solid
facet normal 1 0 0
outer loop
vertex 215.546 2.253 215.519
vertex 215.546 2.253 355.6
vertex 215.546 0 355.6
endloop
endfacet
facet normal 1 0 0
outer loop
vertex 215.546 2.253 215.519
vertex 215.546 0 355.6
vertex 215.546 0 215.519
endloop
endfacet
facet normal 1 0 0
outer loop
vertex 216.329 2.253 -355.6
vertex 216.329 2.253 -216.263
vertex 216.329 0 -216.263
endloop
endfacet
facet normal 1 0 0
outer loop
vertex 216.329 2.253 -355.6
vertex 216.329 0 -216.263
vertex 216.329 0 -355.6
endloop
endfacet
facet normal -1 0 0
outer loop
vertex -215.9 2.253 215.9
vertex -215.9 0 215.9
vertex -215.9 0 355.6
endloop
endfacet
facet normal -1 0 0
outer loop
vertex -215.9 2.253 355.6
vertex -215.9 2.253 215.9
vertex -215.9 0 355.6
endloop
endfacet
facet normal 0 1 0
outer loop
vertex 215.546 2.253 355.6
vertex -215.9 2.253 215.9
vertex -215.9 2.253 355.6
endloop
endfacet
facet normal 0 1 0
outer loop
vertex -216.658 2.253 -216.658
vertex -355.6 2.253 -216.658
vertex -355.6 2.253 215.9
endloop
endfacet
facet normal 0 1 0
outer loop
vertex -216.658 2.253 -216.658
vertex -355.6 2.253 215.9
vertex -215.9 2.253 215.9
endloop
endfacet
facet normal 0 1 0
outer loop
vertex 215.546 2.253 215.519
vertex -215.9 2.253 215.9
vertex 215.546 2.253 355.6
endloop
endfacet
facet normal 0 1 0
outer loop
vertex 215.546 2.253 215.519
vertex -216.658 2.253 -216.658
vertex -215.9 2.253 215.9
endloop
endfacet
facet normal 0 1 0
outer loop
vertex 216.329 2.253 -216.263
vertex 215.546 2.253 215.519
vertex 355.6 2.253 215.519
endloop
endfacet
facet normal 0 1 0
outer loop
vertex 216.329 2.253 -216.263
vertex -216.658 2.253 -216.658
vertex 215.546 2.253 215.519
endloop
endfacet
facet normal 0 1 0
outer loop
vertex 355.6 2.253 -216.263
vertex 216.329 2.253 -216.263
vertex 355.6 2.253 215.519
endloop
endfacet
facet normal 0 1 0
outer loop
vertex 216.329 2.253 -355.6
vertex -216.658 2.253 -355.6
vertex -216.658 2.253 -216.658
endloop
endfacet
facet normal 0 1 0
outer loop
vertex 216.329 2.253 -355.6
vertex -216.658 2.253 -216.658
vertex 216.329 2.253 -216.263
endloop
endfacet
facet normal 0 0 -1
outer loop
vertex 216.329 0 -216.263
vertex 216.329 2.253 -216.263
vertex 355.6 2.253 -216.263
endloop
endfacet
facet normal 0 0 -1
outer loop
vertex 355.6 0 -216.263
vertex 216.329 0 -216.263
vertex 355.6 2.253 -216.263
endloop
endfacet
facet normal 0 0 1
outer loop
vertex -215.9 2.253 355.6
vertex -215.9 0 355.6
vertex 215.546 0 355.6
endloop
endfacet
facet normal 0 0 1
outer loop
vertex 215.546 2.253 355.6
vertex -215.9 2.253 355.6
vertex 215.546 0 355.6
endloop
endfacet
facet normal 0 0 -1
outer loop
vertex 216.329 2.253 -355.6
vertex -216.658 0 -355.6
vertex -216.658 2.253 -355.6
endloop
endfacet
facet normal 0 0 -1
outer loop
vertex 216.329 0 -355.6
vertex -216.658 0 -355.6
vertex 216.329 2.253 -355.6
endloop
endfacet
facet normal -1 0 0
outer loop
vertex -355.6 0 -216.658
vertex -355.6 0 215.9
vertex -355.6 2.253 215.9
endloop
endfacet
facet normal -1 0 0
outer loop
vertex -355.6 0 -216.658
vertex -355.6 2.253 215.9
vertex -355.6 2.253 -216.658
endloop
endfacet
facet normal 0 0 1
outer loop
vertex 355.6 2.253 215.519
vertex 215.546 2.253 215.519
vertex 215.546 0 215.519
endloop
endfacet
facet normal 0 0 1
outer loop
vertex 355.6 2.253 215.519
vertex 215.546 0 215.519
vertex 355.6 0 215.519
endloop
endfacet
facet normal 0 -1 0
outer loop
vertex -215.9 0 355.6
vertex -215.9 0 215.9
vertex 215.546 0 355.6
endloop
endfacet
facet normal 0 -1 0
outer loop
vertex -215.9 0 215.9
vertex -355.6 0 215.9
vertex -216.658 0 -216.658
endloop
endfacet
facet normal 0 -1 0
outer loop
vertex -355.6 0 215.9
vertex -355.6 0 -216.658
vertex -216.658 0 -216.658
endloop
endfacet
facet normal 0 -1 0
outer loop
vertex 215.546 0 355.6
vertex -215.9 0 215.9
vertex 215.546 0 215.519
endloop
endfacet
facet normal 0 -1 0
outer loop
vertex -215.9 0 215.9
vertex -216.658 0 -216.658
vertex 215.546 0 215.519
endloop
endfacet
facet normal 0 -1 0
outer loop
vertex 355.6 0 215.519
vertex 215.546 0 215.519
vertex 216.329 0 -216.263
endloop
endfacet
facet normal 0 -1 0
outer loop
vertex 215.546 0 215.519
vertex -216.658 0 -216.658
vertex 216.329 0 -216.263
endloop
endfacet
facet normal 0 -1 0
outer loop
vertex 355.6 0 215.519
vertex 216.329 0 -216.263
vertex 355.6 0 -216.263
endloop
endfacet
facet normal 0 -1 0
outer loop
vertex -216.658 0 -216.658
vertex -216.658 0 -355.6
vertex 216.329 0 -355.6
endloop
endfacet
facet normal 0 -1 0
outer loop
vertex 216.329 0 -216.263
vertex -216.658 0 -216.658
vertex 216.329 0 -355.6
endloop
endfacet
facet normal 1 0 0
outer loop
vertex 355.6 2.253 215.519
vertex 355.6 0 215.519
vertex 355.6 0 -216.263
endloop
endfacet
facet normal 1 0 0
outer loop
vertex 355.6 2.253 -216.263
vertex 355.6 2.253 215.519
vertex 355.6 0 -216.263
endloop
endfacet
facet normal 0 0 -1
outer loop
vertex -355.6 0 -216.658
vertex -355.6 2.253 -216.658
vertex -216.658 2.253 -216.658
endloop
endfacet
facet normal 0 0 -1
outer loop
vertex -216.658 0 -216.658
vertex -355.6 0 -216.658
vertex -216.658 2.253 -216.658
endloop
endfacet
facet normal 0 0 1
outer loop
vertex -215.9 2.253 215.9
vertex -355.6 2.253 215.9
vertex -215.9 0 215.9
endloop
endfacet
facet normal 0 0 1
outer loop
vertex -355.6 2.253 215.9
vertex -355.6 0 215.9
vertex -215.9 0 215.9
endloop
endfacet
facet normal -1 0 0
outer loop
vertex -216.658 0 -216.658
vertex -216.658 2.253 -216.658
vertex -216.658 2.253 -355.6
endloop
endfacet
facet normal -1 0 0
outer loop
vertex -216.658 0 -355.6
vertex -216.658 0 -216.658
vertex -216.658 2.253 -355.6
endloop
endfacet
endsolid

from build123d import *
from OCP.BRepAlgoAPI import BRepAlgoAPI_Cut
from OCP.TopTools import TopTools_ListOfShape

# Parameters (mm, degrees)
SKETCH1_W           = 711.2
SKETCH1_H           = 711.2
BOSS_EXTRUDE1_DEPTH = 2.252762246
SKETCH2_W           = 139.700021816
SKETCH2_H           = 139.700021816
CUT_EXTRUDE2_DEPTH  = 67.238084533
SKETCH3_W           = 140.054303581
SKETCH3_H           = 140.080522497
CUT_EXTRUDE3_DEPTH  = 67.238084533
SKETCH4_W           = 138.94158885
SKETCH4_H           = 138.94158885
CUT_EXTRUDE4_DEPTH  = 67.238084533
SKETCH5_W           = 139.27145682
SKETCH5_H           = 139.336797366
CUT_EXTRUDE5_DEPTH  = 67.238084533


with BuildPart() as part:
    # Sketch1 → Boss-Extrude1 (new body)
    with BuildSketch(Plane(origin=(0, 0, 0), x_dir=(1, 0, 0), z_dir=(0, 1, 0))):
        Rectangle(SKETCH1_W, SKETCH1_H)
    extrude(amount=BOSS_EXTRUDE1_DEPTH)


with BuildPart() as cut_extrude2_tool:
    # Sketch2 → Cut-Extrude2 (new body)
    with BuildSketch(Plane.XZ):
        with Locations((-285.749998801, 285.749986662)):
            Rectangle(SKETCH2_W, SKETCH2_H)
    extrude(amount=-CUT_EXTRUDE2_DEPTH)


with BuildPart() as part_1:
    add(part.part)

    # Cut-Extrude2: cut by cut_extrude2_tool, with a tolerance
    cut_extrude2_stock = TopTools_ListOfShape()
    cut_extrude2_stock.Append(part_1.part.wrapped)
    cut_extrude2_tools = TopTools_ListOfShape()
    cut_extrude2_tools.Append(cut_extrude2_tool.part.wrapped)
    cut_extrude2_cut = BRepAlgoAPI_Cut()
    cut_extrude2_cut.SetArguments(cut_extrude2_stock)
    cut_extrude2_cut.SetTools(cut_extrude2_tools)
    cut_extrude2_cut.SetFuzzyValue(0.00001)
    cut_extrude2_cut.Build()
    add(Compound.cast(cut_extrude2_cut.Shape()).solids(), mode=Mode.REPLACE)

    # Sketch3 → Cut-Extrude3 (cut)
    with BuildSketch(Plane(origin=(0, 2.252762246, 0), x_dir=(1, 0, 0), z_dir=(0, 1, 0))):
        with Locations((285.57284821, -285.559738752)):
            Rectangle(SKETCH3_W, SKETCH3_H)
    extrude(amount=-CUT_EXTRUDE3_DEPTH, mode=Mode.SUBTRACT)

    # Sketch4 → Cut-Extrude4 (cut)
    with BuildSketch(Plane(origin=(0, 2.252762246, 0), x_dir=(1, 0, 0), z_dir=(0, 1, 0))):
        with Locations((-286.129205575, 286.129205575)):
            Rectangle(SKETCH4_W, SKETCH4_H)
    extrude(amount=-CUT_EXTRUDE4_DEPTH, mode=Mode.SUBTRACT)

    # Sketch5 → Cut-Extrude5 (cut)
    with BuildSketch(Plane(origin=(0, 2.252762246, 0), x_dir=(1, 0, 0), z_dir=(0, 1, 0))):
        with Locations((285.96427159, 285.931601317)):
            Rectangle(SKETCH5_W, SKETCH5_H)
    extrude(amount=-CUT_EXTRUDE5_DEPTH, mode=Mode.SUBTRACT)


solid = part_1.part
